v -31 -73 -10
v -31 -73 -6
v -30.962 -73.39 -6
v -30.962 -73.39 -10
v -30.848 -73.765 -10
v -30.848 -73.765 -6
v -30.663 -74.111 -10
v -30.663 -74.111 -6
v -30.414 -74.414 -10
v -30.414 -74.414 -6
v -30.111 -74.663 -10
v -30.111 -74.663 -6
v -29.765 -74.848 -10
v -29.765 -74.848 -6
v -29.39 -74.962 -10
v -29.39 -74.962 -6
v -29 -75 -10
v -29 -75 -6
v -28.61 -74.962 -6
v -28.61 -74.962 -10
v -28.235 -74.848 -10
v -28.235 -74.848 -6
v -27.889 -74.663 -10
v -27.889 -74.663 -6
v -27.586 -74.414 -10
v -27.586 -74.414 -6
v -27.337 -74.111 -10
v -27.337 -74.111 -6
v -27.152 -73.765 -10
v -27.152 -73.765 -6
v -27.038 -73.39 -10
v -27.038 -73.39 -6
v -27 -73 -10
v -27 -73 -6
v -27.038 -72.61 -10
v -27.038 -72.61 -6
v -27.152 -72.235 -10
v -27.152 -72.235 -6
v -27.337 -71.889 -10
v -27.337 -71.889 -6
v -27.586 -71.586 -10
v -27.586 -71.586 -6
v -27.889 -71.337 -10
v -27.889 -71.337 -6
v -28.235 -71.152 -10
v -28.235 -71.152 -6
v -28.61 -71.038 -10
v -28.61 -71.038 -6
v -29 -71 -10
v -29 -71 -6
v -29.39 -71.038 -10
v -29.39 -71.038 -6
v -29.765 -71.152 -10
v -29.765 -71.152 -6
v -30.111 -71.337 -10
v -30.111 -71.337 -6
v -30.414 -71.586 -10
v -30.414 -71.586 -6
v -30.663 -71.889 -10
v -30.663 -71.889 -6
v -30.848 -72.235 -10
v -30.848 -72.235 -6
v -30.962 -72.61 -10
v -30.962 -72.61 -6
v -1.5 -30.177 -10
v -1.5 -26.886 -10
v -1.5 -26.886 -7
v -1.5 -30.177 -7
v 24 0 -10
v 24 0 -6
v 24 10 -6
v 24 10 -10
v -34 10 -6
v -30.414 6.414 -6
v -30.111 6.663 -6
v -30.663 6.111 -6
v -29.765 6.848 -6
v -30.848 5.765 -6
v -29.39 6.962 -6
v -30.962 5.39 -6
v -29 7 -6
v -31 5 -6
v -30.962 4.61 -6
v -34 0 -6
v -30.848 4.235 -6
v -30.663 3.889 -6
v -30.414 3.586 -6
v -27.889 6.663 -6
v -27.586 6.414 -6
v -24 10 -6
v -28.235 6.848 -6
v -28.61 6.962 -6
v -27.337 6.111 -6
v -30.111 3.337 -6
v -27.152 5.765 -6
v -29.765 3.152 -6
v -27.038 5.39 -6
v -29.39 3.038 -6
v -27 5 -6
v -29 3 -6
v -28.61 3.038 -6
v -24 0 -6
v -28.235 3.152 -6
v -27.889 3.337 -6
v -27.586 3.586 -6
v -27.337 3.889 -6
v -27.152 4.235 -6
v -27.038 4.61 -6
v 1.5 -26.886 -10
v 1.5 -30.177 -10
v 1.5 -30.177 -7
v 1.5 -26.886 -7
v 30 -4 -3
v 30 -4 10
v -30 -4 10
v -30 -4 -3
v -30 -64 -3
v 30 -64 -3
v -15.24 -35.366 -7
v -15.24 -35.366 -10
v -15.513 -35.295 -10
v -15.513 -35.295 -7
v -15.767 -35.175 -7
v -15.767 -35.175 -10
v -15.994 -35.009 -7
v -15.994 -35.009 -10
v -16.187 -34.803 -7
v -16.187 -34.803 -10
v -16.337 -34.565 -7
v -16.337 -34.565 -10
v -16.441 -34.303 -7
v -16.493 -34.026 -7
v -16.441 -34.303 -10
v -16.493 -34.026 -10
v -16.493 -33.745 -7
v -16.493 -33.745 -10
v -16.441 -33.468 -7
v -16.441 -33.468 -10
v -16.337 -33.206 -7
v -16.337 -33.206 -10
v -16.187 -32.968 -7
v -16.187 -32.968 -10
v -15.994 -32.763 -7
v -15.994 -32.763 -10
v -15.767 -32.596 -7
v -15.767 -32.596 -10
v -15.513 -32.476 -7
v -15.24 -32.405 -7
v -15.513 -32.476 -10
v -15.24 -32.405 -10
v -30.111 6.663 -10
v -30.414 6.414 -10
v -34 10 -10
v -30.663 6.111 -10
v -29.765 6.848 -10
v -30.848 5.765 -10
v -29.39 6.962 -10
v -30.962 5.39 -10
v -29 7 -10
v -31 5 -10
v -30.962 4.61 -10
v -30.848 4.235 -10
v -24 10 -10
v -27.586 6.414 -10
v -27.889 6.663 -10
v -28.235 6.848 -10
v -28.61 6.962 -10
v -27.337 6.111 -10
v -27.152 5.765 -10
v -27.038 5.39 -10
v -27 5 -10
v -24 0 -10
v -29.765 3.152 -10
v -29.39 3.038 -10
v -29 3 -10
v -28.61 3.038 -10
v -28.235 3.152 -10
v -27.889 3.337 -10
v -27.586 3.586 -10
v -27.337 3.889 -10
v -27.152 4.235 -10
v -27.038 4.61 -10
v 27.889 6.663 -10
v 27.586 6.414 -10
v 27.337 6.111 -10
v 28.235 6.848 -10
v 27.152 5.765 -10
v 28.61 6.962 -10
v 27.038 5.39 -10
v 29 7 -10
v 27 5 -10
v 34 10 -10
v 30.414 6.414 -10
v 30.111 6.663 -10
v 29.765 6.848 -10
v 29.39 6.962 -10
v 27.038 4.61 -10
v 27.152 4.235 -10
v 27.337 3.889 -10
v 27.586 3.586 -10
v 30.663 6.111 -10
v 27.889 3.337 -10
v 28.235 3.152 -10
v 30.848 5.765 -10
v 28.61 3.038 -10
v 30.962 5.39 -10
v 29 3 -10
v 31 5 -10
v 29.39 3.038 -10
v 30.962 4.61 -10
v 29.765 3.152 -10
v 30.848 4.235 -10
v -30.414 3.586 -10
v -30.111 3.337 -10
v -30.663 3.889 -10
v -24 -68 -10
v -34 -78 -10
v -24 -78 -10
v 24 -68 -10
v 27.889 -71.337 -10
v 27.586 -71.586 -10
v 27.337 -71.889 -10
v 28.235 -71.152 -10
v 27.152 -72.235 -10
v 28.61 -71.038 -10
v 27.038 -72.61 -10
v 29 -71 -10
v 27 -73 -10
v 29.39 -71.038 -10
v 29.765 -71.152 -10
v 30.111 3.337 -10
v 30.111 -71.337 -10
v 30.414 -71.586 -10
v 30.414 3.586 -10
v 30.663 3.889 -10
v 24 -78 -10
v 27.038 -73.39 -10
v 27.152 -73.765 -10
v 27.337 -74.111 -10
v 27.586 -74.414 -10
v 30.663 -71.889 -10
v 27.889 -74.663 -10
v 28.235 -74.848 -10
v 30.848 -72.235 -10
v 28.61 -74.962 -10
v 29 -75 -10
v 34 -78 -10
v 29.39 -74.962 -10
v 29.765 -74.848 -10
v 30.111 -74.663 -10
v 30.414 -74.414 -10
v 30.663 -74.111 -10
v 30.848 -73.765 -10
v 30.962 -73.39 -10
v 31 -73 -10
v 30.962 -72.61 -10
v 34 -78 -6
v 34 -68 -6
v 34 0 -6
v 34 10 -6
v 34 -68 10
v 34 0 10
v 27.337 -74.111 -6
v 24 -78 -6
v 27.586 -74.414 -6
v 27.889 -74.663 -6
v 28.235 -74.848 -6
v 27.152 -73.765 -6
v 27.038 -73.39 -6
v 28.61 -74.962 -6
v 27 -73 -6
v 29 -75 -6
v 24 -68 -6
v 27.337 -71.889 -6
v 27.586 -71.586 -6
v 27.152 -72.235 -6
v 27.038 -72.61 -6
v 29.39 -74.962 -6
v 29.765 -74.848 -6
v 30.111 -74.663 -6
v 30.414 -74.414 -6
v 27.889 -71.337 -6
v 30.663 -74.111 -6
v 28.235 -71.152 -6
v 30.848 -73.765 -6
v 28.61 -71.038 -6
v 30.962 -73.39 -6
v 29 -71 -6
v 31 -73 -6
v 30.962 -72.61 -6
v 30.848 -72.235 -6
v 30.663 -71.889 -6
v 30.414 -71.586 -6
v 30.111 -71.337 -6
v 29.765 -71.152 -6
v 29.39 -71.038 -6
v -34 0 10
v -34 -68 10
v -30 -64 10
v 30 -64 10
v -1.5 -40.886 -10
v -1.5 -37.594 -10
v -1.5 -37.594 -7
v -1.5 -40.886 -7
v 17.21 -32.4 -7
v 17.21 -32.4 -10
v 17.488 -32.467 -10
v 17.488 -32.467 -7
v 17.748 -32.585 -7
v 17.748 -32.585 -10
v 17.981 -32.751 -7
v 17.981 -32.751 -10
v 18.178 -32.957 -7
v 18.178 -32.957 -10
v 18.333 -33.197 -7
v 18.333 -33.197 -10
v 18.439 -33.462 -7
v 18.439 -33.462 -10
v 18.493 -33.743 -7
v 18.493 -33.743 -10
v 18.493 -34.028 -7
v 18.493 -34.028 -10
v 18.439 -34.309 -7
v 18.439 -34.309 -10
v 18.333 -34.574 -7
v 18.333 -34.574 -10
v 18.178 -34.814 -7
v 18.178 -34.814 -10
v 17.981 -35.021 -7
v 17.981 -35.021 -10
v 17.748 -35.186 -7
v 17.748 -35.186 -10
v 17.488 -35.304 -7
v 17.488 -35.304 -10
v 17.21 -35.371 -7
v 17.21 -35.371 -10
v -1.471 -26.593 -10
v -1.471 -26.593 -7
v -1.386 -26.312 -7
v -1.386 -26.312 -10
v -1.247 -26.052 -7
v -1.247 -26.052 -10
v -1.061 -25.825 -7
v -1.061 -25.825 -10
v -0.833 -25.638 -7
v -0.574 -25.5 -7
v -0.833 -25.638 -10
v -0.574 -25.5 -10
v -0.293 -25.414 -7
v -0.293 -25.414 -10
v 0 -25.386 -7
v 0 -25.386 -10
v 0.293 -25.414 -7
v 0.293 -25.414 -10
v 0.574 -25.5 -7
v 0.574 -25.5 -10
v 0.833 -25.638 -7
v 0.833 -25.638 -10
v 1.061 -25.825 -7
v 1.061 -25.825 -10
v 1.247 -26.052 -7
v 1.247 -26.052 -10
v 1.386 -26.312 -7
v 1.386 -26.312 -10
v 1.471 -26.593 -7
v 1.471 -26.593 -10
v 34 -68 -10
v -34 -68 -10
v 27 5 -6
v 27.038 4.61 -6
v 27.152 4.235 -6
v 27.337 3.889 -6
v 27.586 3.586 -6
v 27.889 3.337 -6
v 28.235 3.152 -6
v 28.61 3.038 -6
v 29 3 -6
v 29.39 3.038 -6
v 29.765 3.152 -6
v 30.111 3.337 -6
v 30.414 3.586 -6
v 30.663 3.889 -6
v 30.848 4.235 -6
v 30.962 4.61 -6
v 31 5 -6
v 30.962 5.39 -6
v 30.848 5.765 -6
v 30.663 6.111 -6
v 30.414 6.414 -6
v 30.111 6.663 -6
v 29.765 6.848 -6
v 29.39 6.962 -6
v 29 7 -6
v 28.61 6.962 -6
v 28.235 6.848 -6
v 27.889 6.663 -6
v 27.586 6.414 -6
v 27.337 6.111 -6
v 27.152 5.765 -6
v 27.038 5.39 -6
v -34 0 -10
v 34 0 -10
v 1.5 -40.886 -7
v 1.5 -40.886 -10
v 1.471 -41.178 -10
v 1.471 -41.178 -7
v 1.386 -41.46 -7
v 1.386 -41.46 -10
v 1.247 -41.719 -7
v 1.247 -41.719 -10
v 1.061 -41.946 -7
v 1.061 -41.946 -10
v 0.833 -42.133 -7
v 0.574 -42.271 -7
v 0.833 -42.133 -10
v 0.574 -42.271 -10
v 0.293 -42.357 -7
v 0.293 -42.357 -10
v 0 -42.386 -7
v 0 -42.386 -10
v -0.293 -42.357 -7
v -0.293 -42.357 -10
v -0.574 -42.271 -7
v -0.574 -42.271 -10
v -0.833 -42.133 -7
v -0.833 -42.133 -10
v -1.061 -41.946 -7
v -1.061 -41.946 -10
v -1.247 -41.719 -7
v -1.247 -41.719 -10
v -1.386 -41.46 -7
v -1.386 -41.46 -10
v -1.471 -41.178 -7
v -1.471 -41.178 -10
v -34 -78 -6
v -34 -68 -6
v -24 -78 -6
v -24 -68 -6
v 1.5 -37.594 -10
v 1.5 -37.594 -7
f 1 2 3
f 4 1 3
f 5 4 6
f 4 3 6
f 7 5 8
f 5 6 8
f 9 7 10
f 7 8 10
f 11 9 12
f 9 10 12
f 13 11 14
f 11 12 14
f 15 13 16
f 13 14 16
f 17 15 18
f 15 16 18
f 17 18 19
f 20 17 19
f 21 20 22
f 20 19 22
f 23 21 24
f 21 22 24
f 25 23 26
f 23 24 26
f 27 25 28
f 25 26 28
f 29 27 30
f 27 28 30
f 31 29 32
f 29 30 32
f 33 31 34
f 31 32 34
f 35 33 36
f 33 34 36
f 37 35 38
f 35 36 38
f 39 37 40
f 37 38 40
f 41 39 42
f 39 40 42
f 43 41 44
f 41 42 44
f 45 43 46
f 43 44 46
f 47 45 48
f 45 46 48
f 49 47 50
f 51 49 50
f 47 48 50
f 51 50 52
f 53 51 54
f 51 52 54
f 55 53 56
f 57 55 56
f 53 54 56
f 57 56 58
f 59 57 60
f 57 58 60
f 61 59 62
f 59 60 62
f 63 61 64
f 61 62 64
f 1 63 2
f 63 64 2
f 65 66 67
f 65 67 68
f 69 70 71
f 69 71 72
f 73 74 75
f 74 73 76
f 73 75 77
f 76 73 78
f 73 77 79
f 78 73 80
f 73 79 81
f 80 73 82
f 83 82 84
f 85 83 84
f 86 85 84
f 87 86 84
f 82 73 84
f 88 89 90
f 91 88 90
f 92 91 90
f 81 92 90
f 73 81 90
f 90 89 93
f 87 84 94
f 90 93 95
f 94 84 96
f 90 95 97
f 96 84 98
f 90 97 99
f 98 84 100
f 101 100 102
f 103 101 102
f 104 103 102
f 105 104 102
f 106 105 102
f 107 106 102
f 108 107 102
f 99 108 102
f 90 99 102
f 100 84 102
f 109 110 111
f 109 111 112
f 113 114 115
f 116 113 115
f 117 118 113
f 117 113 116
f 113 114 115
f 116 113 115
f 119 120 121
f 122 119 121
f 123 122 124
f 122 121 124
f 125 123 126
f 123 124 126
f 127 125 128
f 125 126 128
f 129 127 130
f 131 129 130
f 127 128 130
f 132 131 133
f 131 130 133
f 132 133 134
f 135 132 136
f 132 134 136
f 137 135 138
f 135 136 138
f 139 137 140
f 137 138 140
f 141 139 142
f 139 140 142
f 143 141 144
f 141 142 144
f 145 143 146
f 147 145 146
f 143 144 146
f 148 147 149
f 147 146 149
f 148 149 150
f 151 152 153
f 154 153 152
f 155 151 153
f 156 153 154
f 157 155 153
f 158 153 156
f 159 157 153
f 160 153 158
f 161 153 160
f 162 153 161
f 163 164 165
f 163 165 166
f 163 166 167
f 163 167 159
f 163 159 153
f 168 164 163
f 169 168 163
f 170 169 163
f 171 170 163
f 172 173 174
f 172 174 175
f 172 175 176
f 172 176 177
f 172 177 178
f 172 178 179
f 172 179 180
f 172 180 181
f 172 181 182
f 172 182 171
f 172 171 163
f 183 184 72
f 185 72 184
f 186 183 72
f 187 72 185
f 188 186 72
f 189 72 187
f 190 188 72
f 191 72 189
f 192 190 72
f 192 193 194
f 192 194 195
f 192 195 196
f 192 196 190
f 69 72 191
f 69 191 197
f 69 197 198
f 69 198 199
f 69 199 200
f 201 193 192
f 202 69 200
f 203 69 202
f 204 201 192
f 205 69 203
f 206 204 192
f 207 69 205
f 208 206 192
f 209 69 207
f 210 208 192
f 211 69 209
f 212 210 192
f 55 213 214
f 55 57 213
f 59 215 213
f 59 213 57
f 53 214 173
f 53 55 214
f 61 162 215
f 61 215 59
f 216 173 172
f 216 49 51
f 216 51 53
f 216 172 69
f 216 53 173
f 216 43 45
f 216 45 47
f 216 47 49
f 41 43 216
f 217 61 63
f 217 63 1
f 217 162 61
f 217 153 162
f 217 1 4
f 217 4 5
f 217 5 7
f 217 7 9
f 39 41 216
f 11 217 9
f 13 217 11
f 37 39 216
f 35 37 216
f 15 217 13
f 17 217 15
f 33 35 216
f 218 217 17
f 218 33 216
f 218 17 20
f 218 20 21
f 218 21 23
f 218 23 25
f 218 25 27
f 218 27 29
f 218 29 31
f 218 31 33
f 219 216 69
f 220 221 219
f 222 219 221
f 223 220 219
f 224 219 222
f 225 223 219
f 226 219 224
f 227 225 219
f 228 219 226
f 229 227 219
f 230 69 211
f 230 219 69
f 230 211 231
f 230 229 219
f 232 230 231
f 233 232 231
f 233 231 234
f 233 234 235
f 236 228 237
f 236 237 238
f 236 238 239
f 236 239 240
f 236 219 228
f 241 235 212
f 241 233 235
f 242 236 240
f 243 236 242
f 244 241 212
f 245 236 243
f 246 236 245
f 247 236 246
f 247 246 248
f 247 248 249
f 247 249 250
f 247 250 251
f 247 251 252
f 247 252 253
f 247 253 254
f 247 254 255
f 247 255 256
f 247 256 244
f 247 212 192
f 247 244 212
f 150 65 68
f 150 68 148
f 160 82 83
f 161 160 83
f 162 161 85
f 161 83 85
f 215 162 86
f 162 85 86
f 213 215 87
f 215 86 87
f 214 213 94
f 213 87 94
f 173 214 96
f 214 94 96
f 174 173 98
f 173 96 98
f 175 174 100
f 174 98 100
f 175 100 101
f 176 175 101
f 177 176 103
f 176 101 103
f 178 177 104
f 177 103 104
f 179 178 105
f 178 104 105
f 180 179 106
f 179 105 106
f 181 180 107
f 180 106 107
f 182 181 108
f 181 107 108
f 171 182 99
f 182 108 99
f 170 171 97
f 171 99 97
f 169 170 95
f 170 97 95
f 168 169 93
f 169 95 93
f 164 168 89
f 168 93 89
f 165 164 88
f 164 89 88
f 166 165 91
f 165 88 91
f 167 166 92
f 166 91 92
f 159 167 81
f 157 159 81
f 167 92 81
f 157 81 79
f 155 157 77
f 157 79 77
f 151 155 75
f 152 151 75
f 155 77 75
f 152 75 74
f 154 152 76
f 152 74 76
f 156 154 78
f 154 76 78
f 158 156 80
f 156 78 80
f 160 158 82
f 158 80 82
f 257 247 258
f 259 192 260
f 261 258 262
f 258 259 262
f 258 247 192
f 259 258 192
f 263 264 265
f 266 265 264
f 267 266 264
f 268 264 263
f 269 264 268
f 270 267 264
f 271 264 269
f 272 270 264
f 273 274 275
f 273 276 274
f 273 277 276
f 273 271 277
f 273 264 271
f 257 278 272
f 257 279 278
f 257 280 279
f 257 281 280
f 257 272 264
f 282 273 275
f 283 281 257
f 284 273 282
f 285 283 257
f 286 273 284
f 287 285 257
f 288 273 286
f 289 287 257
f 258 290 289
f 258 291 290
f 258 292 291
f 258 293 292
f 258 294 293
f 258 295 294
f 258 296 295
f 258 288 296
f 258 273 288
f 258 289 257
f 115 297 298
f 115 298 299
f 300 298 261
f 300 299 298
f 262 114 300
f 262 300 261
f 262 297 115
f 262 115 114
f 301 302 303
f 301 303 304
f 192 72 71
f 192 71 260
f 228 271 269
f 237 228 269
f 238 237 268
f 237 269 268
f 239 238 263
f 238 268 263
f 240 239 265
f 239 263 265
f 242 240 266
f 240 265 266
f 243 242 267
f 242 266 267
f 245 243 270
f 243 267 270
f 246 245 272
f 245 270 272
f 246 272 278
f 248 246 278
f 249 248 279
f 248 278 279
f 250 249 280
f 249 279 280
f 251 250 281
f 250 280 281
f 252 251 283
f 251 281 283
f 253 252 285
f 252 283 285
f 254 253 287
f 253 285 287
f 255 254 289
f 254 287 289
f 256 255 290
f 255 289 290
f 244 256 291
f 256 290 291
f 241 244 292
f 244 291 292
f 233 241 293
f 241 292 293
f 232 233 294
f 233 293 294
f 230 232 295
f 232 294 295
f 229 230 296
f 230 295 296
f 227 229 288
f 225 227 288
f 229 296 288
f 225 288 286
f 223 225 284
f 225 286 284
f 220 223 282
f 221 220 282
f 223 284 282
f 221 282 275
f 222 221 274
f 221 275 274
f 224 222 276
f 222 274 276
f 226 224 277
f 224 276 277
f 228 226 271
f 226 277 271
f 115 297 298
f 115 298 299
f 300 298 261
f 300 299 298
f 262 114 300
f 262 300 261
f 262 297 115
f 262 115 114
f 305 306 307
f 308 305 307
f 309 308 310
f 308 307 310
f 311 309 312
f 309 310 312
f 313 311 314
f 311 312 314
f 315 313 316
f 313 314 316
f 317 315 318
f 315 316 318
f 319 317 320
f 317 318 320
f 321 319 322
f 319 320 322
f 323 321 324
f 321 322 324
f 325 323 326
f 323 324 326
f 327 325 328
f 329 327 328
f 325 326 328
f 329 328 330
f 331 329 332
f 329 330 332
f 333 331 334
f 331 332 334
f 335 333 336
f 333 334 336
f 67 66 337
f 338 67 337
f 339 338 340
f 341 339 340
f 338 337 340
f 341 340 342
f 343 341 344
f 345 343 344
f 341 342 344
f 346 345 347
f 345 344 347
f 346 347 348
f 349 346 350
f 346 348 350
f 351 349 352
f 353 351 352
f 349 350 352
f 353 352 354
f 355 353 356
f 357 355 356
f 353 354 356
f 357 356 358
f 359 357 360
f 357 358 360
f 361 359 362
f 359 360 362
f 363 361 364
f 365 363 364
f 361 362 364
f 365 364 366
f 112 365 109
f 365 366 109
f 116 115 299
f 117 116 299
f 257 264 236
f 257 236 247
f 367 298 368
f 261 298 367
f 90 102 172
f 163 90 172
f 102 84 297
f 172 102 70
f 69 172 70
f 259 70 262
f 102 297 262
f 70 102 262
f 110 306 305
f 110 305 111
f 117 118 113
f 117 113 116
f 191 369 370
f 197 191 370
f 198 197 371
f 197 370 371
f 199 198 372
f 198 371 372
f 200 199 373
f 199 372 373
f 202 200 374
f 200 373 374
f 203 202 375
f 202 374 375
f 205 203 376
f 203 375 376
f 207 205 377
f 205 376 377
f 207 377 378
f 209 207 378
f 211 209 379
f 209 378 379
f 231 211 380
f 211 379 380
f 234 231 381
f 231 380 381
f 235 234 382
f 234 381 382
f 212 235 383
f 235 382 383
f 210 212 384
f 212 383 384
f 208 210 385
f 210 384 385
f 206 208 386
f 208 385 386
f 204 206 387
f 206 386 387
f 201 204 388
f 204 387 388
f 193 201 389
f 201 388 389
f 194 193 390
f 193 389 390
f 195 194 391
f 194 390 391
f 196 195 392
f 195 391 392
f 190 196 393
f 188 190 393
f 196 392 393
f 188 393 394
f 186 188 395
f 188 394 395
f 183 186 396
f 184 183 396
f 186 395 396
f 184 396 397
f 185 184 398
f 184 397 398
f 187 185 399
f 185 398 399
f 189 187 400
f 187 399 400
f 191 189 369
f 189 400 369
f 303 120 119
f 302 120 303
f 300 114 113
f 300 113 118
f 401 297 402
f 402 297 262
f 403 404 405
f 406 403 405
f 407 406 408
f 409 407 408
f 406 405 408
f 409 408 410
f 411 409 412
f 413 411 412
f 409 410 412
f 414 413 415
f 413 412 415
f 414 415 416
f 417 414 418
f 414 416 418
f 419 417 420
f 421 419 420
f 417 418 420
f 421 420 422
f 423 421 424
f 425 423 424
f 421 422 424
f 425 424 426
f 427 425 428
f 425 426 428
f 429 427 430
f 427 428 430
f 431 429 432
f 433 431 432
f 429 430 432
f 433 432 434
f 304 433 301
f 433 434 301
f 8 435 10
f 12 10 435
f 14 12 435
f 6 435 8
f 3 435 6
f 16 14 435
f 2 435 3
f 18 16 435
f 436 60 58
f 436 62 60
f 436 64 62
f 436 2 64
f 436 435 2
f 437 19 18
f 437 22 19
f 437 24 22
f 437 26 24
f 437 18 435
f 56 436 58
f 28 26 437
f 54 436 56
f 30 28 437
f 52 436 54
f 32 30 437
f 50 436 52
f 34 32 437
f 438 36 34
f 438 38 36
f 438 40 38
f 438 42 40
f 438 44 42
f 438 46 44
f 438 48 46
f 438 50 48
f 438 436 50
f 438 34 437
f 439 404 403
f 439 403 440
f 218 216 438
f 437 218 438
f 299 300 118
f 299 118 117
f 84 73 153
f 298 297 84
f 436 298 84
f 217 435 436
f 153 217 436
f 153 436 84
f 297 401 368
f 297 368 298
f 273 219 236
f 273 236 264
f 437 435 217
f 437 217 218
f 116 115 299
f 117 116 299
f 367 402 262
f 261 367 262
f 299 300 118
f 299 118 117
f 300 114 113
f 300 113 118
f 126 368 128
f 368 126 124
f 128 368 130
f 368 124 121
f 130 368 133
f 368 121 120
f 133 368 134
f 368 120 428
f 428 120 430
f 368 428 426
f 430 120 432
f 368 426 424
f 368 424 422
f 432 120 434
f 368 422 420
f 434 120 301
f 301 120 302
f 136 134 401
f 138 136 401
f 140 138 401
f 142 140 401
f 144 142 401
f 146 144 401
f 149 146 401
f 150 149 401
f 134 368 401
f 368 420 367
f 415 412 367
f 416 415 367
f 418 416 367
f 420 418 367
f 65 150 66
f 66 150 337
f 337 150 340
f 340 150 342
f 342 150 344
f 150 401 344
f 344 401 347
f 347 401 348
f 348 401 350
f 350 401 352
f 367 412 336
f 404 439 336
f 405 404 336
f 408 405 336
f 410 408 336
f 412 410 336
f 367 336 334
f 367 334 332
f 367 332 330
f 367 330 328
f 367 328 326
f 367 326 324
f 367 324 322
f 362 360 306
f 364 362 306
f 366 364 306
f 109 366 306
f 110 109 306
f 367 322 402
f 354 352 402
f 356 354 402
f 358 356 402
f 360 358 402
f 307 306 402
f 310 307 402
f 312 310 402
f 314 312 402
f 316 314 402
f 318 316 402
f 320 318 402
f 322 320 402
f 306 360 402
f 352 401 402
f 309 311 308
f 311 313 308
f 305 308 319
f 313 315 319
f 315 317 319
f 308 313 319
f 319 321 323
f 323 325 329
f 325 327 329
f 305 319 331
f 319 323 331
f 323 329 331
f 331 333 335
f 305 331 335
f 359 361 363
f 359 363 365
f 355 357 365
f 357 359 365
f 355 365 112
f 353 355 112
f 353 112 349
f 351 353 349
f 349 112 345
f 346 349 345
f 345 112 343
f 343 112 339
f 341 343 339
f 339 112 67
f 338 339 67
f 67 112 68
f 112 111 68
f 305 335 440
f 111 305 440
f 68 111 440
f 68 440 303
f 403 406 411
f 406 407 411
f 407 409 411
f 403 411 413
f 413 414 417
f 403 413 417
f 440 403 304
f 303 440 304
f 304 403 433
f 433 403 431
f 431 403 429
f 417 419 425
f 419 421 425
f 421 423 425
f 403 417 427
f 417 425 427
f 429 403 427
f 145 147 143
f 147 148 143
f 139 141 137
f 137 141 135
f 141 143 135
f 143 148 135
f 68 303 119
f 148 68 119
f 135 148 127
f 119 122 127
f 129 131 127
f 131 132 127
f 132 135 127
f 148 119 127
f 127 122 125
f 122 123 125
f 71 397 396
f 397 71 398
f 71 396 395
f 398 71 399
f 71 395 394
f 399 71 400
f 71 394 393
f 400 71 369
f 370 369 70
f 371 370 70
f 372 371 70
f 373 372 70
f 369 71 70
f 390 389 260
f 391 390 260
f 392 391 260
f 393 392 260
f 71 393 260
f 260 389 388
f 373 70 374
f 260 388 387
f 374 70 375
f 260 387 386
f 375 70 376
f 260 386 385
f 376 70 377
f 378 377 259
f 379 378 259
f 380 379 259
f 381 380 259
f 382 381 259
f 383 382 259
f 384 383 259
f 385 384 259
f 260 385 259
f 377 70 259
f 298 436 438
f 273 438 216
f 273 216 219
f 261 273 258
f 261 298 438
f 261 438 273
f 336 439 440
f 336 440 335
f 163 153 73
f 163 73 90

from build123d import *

# Parameters (mm, degrees)
SKETCH_W        = 68
SKETCH_H        = 20
PAD_DEPTH       = 68
SKETCH001_W     = 60
SKETCH001_H     = 60
POCKET_DEPTH    = 13
SKETCH002_W     = 10
SKETCH002_H     = 4
PAD001_DEPTH    = 10
SKETCH003_W     = 10
SKETCH003_H     = 4
PAD002_DEPTH    = 10
SKETCH004_W     = 10
SKETCH004_H     = 4
PAD003_DEPTH    = 10
SKETCH005_R     = 2
POCKET001_DEPTH = 4
SKETCH006_R     = 2
POCKET002_DEPTH = 4
SKETCH007_R     = 2
POCKET003_DEPTH = 4
SKETCH008_R     = 2
POCKET004_DEPTH = 4
POCKET005_DEPTH = 3


with BuildPart() as pocket:
    # Sketch → Pad (new body)
    with BuildSketch(Plane.XZ):
        Rectangle(SKETCH_W, SKETCH_H)
    extrude(amount=PAD_DEPTH)

    # Sketch001 → Pocket (cut)
    with BuildSketch(Plane(origin=(0, 0, 10), x_dir=(-1, 0, 0), z_dir=(0, 0, 1))):
        with Locations((0, 34)):
            Rectangle(SKETCH001_W, SKETCH001_H)
    extrude(amount=-POCKET_DEPTH, mode=Mode.SUBTRACT)


with BuildPart() as forat4:
    # Pad001 base: copy of Pocket
    add(pocket.part)

    # Sketch002 → Pad001 (new body)
    with BuildSketch(Plane.XZ.offset(68)):
        with Locations((-29, -8)):
            Rectangle(SKETCH002_W, SKETCH002_H)
        with Locations((29, -8)):
            Rectangle(SKETCH002_W, SKETCH002_H)
    extrude(amount=PAD001_DEPTH)

    # Sketch003 → Pad002 (new body)
    with BuildSketch(Plane(origin=(0, 0, 0), x_dir=(1, 0, 0), z_dir=(0, 1, 0))):
        with Locations((-29, 8)):
            Rectangle(SKETCH003_W, SKETCH003_H)
        with Locations((29, 8)):
            Rectangle(SKETCH003_W, SKETCH003_H)
    extrude(amount=PAD002_DEPTH)

    # Sketch004 → Pad003 (new body)
    with BuildSketch(Plane(origin=(0, 0, 0), x_dir=(1, 0, 0), z_dir=(0, 1, 0))):
        with Locations((29, 8)):
            Rectangle(SKETCH004_W, SKETCH004_H)
    extrude(amount=PAD003_DEPTH)

    # Sketch005 → Pocket001 (cut)
    with BuildSketch(Plane(origin=(0, 0, -6), x_dir=(-1, 0, 0), z_dir=(0, 0, 1))):
        with Locations((-29, 73)):
            Circle(SKETCH005_R)
    extrude(amount=-POCKET001_DEPTH, mode=Mode.SUBTRACT)

    # Sketch006 → Pocket002 (cut)
    with BuildSketch(Plane(origin=(0, 0, -6), x_dir=(-1, 0, 0), z_dir=(0, 0, 1))):
        with Locations((29, 73)):
            Circle(SKETCH006_R)
    extrude(amount=-POCKET002_DEPTH, mode=Mode.SUBTRACT)

    # Sketch007 → Pocket003 (cut)
    with BuildSketch(Plane(origin=(0, 0, -6), x_dir=(-1, 0, 0), z_dir=(0, 0, 1))):
        with Locations((-29, -5)):
            Circle(SKETCH007_R)
    extrude(amount=-POCKET003_DEPTH, mode=Mode.SUBTRACT)

    # Sketch008 → Pocket004 (cut)
    with BuildSketch(Plane(origin=(0, 0, -6), x_dir=(-1, 0, 0), z_dir=(0, 0, 1))):
        with Locations((29, -5)):
            Circle(SKETCH008_R)
    extrude(amount=-POCKET004_DEPTH, mode=Mode.SUBTRACT)


with BuildPart() as pocket005:
    # Pocket005 base: copy of Pocket
    add(pocket.part)

    # Sketch010 → Pocket005 (cut)
    with BuildSketch(Plane(origin=(0, 0, -10), x_dir=(1, 0, 0), z_dir=(0, 0, -1))):
        with BuildLine():
            Line((-1.5, 37.593671), (-1.5, 40.885572))
            ThreePointArc((1.5, 40.885572), (0, 42.385572), (-1.5, 40.885572))
            Line((1.5, 40.885572), (1.5, 37.593671))
            Line((1.5, 37.593671), (17.210148, 35.370778))
            ThreePointArc((17.210148, 32.400366), (18.5, 33.885572), (17.210148, 35.370778))
            Line((17.210148, 32.400366), (1.5, 30.177473))
            Line((1.5, 30.177473), (1.5, 26.885572))
            ThreePointArc((-1.5, 26.885572), (0, 25.385572), (1.5, 26.885572))
            Line((-1.5, 26.885572), (-1.5, 30.177473))
            Line((-1.5, 30.177473), (-15.240035, 32.404902))
            ThreePointArc((-15.240035, 35.366242), (-16.5, 33.885572), (-15.240035, 32.404902))
            Line((-15.240035, 35.366242), (-1.5, 37.593671))
        make_face()
    extrude(amount=-POCKET005_DEPTH, mode=Mode.SUBTRACT)


solid = Compound([forat4.part, pocket005.part])
